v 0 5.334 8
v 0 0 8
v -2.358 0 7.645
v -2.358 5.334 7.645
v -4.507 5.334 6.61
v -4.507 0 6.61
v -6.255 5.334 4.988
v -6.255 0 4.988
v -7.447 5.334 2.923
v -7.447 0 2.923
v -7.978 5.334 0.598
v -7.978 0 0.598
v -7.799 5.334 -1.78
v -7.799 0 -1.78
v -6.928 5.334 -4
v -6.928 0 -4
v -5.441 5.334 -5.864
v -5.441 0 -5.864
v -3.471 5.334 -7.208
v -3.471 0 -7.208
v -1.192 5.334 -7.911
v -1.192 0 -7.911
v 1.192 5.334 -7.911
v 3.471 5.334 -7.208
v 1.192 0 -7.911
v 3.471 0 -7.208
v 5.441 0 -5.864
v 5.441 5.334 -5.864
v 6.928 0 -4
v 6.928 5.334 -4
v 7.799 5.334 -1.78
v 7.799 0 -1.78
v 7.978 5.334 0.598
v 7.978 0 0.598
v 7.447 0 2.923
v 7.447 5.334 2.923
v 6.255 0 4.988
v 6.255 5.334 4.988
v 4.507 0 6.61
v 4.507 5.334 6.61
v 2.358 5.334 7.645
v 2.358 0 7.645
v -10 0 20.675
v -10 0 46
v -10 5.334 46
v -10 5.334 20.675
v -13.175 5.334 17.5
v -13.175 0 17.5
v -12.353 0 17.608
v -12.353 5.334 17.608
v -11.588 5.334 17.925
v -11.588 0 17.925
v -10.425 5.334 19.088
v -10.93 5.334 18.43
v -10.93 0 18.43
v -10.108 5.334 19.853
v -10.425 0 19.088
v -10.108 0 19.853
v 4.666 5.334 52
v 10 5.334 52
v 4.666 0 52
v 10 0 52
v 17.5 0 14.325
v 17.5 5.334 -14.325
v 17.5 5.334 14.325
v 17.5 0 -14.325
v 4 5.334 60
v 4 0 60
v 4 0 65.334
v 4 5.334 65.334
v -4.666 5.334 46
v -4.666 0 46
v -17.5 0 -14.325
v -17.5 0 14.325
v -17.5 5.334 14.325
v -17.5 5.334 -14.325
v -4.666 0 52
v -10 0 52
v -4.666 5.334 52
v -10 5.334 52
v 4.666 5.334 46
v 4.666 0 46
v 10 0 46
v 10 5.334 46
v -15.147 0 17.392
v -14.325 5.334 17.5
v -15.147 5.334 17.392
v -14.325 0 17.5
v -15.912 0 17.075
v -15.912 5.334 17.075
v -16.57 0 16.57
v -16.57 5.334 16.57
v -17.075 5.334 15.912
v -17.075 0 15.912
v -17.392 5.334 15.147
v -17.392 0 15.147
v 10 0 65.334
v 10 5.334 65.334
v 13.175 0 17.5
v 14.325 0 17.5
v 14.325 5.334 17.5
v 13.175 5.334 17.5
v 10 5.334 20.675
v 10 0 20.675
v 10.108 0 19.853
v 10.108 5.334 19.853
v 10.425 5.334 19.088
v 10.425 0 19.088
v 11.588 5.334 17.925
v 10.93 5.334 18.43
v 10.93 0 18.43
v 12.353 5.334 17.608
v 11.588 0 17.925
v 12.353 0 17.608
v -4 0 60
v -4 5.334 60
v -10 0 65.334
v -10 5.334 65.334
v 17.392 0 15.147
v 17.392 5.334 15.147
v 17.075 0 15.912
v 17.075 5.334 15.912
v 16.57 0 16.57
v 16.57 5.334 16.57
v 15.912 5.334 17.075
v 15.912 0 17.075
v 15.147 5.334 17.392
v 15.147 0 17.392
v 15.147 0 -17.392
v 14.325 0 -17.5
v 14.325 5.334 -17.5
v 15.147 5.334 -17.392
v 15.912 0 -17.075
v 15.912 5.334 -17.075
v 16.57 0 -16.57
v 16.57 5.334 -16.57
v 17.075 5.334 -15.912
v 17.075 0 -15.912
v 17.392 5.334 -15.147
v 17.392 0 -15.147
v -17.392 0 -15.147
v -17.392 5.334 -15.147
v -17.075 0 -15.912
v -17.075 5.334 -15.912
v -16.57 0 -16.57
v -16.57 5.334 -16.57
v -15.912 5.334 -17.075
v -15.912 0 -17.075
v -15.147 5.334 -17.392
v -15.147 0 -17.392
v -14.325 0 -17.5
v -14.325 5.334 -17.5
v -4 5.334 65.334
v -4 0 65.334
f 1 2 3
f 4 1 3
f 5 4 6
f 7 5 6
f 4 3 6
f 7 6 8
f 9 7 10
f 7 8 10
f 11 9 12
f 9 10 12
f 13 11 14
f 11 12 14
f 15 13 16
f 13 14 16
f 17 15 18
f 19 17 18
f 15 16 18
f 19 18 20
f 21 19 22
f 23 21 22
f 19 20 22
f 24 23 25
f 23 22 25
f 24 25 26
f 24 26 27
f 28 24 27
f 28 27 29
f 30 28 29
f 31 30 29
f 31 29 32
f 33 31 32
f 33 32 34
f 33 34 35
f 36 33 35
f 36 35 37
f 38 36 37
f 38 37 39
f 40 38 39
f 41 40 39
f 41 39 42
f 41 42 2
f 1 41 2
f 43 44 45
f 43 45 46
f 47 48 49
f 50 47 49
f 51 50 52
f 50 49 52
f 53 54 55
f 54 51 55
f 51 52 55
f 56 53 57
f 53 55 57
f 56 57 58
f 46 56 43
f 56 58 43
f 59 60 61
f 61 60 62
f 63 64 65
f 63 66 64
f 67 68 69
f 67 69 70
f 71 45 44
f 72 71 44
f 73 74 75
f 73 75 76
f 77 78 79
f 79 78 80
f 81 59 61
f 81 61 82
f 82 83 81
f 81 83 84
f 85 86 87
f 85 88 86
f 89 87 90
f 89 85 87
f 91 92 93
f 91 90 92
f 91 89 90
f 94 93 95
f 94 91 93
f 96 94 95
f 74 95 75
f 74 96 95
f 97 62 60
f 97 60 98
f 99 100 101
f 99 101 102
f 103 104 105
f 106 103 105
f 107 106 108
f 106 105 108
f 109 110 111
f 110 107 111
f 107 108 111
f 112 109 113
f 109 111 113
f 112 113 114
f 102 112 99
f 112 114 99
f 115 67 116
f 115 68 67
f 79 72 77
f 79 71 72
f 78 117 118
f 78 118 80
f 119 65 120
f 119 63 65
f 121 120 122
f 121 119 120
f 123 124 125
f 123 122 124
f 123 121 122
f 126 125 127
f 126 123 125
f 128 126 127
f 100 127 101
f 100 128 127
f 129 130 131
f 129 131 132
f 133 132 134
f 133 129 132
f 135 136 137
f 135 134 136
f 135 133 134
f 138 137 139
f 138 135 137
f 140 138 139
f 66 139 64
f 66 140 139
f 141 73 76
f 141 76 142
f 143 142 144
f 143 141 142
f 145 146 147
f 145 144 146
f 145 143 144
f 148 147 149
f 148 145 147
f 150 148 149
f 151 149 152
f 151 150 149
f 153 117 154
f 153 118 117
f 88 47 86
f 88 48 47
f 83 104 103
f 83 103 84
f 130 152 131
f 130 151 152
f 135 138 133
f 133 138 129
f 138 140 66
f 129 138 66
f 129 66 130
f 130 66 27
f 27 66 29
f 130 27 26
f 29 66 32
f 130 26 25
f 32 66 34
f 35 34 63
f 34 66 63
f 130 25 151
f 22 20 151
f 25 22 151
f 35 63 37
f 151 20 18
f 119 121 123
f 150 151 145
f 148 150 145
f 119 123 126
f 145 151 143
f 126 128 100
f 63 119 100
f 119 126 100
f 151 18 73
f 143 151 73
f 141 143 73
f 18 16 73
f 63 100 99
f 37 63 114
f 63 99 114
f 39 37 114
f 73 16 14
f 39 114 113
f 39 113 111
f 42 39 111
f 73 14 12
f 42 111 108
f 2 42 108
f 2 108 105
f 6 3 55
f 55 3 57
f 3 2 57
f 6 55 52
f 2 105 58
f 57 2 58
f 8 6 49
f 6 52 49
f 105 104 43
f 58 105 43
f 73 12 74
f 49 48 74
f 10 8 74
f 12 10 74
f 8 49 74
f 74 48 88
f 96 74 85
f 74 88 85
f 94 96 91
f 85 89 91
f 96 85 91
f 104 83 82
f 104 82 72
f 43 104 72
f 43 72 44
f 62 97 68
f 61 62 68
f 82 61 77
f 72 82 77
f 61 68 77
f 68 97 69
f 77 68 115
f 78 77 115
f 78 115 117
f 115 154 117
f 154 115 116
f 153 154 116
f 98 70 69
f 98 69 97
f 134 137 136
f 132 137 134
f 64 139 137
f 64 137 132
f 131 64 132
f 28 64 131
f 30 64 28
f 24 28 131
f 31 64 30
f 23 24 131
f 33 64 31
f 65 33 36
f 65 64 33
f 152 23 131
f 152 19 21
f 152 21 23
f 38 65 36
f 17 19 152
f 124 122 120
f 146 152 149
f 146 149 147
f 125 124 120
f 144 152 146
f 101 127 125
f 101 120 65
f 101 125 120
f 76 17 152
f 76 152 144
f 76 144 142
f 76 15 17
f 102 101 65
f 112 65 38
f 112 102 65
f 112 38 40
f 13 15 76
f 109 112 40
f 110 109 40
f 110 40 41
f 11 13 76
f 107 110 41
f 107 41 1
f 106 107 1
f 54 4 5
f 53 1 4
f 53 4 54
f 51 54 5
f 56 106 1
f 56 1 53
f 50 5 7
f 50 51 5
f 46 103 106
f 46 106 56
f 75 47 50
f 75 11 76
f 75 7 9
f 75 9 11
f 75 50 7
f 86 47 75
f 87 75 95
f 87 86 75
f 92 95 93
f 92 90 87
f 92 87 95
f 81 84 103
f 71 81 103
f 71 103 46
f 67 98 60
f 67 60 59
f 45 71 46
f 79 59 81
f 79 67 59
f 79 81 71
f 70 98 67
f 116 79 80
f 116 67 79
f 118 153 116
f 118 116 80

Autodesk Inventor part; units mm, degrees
ref_plane "YZ Plane" through (0, 0, 0) normal (1, 0, 0) x (0, 1, 0)
ref_plane "XZ Plane" through (0, 0, 0) normal (0, 1, 0) x (-1, 0, 0)
ref_plane "XY Plane" through (0, 0, 0) normal (0, 0, 1) x (1, 0, 0)
sketch "Sketch1" plane through (0, 0, 0) normal (0, 1, 0) x (-1, 0, 0)
  line L0 (17.5, 14.325) -> (17.5, -14.325)
  line L1 (14.325, -17.5) -> (-14.325, -17.5)
  line L2 (-17.5, -14.325) -> (-17.5, 14.325)
  line L3 (-14.325, 17.5) -> (-13.175, 17.5)
  line L4 (-10, 20.675) -> (-10, 60)
  line L5 (-10, 60) -> (10, 60)
  line L6 (10, 60) -> (10, 20.675)
  line L7 (13.175, 17.5) -> (14.325, 17.5)
  arc A0 (10, 20.675) -> (13.175, 17.5) centre (13.175, 20.675) ccw
  arc A1 (-13.175, 17.5) -> (-10, 20.675) centre (-13.175, 20.675) ccw
  arc A2 (17.5, 14.325) -> (14.325, 17.5) centre (14.325, 14.325) ccw
  arc A3 (14.325, -17.5) -> (17.5, -14.325) centre (14.325, -14.325) ccw
  arc A4 (-17.5, -14.325) -> (-14.325, -17.5) centre (-14.325, -14.325) ccw
  arc A5 (-14.325, 17.5) -> (-17.5, 14.325) centre (-14.325, 14.325) ccw
  point P0 (0, 0)
  point P1 (17.5, 17.5)
  point P2 (17.5, -17.5)
  point P3 (-17.5, -17.5)
  point P4 (-17.5, 17.5)
  point P5 (-10, 17.5)
  point P6 (10, 17.5)
  point P7 (17.5, 0)
  point P8 (0, -17.5)
  point P9 (0, 60)
  dimension "d0" = 35
  dimension "d1" = 35
  dimension "d2" = 20
  dimension "d3" = 60
  dimension "d26" = 3.175
  dimension "d27" = 3.175
extrude "Extrusion1" add sketch "Sketch1" along normal blind 5.334
sketch "Sketch3" plane through (0, 5.334, 0) normal (0, 1, 0) x (1, 0, 0)
  point P0 (0, 0)
  point P1 (0, 0)
hole "Hole2" at (0, 5.334, 0) direction (0, -1, 0) diameter 16 end through all
sketch "Sketch6" plane through (10, 0, 60) normal (1, 0, 0) x (0, 0, -1)
  line L0 (0, 5.334) -> (39.325, 5.334) projected
  line L1 (0, 0) -> (39.325, 0) projected
  line L2 (14, 5.334) -> (8, 5.334)
  line L3 (8, 5.334) -> (8, 0)
  line L4 (8, 0) -> (14, 0)
  line L5 (14, 0) -> (14, 5.334)
  line L6 (0, 0) -> (0, 5.334) projected
  point P0 (60, 0)
  dimension "d41" = 6
  dimension "d42" = 8
extrude "Extrusion3" cut sketch "Sketch6" against normal blind 5.334 contours L0 L5 L1 L3
sketch "Sketch5" plane through (-10, 0, 60) normal (0, 0, 1) x (1, 0, 0)
  line L0 (0, 5.334) -> (20, 5.334) projected
  line L1 (0, 0) -> (6, 0)
  line L2 (6, 0) -> (6, 5.334)
  line L3 (6, 5.334) -> (0, 5.334)
  line L4 (0, 5.334) -> (0, 0)
  line L5 (20, 0) -> (14, 0)
  line L6 (14, 0) -> (14, 5.334)
  line L7 (14, 5.334) -> (20, 5.334)
  line L8 (20, 5.334) -> (20, 0)
  line L9 (20, 0) -> (20, 5.334) projected
  point P0 (10, 0)
  point P1 (20, 2.667)
  dimension "d45" = 6
  dimension "d46" = 6
extrude "Extrusion2" add sketch "Sketch5" along normal blind 5.334
mirror "Mirror1" about plane through (0, 0, 0) normal (1, 0, 0) of "Extrusion3"
equation "\"d46\" = d45"
properties part number "pitch_support"
